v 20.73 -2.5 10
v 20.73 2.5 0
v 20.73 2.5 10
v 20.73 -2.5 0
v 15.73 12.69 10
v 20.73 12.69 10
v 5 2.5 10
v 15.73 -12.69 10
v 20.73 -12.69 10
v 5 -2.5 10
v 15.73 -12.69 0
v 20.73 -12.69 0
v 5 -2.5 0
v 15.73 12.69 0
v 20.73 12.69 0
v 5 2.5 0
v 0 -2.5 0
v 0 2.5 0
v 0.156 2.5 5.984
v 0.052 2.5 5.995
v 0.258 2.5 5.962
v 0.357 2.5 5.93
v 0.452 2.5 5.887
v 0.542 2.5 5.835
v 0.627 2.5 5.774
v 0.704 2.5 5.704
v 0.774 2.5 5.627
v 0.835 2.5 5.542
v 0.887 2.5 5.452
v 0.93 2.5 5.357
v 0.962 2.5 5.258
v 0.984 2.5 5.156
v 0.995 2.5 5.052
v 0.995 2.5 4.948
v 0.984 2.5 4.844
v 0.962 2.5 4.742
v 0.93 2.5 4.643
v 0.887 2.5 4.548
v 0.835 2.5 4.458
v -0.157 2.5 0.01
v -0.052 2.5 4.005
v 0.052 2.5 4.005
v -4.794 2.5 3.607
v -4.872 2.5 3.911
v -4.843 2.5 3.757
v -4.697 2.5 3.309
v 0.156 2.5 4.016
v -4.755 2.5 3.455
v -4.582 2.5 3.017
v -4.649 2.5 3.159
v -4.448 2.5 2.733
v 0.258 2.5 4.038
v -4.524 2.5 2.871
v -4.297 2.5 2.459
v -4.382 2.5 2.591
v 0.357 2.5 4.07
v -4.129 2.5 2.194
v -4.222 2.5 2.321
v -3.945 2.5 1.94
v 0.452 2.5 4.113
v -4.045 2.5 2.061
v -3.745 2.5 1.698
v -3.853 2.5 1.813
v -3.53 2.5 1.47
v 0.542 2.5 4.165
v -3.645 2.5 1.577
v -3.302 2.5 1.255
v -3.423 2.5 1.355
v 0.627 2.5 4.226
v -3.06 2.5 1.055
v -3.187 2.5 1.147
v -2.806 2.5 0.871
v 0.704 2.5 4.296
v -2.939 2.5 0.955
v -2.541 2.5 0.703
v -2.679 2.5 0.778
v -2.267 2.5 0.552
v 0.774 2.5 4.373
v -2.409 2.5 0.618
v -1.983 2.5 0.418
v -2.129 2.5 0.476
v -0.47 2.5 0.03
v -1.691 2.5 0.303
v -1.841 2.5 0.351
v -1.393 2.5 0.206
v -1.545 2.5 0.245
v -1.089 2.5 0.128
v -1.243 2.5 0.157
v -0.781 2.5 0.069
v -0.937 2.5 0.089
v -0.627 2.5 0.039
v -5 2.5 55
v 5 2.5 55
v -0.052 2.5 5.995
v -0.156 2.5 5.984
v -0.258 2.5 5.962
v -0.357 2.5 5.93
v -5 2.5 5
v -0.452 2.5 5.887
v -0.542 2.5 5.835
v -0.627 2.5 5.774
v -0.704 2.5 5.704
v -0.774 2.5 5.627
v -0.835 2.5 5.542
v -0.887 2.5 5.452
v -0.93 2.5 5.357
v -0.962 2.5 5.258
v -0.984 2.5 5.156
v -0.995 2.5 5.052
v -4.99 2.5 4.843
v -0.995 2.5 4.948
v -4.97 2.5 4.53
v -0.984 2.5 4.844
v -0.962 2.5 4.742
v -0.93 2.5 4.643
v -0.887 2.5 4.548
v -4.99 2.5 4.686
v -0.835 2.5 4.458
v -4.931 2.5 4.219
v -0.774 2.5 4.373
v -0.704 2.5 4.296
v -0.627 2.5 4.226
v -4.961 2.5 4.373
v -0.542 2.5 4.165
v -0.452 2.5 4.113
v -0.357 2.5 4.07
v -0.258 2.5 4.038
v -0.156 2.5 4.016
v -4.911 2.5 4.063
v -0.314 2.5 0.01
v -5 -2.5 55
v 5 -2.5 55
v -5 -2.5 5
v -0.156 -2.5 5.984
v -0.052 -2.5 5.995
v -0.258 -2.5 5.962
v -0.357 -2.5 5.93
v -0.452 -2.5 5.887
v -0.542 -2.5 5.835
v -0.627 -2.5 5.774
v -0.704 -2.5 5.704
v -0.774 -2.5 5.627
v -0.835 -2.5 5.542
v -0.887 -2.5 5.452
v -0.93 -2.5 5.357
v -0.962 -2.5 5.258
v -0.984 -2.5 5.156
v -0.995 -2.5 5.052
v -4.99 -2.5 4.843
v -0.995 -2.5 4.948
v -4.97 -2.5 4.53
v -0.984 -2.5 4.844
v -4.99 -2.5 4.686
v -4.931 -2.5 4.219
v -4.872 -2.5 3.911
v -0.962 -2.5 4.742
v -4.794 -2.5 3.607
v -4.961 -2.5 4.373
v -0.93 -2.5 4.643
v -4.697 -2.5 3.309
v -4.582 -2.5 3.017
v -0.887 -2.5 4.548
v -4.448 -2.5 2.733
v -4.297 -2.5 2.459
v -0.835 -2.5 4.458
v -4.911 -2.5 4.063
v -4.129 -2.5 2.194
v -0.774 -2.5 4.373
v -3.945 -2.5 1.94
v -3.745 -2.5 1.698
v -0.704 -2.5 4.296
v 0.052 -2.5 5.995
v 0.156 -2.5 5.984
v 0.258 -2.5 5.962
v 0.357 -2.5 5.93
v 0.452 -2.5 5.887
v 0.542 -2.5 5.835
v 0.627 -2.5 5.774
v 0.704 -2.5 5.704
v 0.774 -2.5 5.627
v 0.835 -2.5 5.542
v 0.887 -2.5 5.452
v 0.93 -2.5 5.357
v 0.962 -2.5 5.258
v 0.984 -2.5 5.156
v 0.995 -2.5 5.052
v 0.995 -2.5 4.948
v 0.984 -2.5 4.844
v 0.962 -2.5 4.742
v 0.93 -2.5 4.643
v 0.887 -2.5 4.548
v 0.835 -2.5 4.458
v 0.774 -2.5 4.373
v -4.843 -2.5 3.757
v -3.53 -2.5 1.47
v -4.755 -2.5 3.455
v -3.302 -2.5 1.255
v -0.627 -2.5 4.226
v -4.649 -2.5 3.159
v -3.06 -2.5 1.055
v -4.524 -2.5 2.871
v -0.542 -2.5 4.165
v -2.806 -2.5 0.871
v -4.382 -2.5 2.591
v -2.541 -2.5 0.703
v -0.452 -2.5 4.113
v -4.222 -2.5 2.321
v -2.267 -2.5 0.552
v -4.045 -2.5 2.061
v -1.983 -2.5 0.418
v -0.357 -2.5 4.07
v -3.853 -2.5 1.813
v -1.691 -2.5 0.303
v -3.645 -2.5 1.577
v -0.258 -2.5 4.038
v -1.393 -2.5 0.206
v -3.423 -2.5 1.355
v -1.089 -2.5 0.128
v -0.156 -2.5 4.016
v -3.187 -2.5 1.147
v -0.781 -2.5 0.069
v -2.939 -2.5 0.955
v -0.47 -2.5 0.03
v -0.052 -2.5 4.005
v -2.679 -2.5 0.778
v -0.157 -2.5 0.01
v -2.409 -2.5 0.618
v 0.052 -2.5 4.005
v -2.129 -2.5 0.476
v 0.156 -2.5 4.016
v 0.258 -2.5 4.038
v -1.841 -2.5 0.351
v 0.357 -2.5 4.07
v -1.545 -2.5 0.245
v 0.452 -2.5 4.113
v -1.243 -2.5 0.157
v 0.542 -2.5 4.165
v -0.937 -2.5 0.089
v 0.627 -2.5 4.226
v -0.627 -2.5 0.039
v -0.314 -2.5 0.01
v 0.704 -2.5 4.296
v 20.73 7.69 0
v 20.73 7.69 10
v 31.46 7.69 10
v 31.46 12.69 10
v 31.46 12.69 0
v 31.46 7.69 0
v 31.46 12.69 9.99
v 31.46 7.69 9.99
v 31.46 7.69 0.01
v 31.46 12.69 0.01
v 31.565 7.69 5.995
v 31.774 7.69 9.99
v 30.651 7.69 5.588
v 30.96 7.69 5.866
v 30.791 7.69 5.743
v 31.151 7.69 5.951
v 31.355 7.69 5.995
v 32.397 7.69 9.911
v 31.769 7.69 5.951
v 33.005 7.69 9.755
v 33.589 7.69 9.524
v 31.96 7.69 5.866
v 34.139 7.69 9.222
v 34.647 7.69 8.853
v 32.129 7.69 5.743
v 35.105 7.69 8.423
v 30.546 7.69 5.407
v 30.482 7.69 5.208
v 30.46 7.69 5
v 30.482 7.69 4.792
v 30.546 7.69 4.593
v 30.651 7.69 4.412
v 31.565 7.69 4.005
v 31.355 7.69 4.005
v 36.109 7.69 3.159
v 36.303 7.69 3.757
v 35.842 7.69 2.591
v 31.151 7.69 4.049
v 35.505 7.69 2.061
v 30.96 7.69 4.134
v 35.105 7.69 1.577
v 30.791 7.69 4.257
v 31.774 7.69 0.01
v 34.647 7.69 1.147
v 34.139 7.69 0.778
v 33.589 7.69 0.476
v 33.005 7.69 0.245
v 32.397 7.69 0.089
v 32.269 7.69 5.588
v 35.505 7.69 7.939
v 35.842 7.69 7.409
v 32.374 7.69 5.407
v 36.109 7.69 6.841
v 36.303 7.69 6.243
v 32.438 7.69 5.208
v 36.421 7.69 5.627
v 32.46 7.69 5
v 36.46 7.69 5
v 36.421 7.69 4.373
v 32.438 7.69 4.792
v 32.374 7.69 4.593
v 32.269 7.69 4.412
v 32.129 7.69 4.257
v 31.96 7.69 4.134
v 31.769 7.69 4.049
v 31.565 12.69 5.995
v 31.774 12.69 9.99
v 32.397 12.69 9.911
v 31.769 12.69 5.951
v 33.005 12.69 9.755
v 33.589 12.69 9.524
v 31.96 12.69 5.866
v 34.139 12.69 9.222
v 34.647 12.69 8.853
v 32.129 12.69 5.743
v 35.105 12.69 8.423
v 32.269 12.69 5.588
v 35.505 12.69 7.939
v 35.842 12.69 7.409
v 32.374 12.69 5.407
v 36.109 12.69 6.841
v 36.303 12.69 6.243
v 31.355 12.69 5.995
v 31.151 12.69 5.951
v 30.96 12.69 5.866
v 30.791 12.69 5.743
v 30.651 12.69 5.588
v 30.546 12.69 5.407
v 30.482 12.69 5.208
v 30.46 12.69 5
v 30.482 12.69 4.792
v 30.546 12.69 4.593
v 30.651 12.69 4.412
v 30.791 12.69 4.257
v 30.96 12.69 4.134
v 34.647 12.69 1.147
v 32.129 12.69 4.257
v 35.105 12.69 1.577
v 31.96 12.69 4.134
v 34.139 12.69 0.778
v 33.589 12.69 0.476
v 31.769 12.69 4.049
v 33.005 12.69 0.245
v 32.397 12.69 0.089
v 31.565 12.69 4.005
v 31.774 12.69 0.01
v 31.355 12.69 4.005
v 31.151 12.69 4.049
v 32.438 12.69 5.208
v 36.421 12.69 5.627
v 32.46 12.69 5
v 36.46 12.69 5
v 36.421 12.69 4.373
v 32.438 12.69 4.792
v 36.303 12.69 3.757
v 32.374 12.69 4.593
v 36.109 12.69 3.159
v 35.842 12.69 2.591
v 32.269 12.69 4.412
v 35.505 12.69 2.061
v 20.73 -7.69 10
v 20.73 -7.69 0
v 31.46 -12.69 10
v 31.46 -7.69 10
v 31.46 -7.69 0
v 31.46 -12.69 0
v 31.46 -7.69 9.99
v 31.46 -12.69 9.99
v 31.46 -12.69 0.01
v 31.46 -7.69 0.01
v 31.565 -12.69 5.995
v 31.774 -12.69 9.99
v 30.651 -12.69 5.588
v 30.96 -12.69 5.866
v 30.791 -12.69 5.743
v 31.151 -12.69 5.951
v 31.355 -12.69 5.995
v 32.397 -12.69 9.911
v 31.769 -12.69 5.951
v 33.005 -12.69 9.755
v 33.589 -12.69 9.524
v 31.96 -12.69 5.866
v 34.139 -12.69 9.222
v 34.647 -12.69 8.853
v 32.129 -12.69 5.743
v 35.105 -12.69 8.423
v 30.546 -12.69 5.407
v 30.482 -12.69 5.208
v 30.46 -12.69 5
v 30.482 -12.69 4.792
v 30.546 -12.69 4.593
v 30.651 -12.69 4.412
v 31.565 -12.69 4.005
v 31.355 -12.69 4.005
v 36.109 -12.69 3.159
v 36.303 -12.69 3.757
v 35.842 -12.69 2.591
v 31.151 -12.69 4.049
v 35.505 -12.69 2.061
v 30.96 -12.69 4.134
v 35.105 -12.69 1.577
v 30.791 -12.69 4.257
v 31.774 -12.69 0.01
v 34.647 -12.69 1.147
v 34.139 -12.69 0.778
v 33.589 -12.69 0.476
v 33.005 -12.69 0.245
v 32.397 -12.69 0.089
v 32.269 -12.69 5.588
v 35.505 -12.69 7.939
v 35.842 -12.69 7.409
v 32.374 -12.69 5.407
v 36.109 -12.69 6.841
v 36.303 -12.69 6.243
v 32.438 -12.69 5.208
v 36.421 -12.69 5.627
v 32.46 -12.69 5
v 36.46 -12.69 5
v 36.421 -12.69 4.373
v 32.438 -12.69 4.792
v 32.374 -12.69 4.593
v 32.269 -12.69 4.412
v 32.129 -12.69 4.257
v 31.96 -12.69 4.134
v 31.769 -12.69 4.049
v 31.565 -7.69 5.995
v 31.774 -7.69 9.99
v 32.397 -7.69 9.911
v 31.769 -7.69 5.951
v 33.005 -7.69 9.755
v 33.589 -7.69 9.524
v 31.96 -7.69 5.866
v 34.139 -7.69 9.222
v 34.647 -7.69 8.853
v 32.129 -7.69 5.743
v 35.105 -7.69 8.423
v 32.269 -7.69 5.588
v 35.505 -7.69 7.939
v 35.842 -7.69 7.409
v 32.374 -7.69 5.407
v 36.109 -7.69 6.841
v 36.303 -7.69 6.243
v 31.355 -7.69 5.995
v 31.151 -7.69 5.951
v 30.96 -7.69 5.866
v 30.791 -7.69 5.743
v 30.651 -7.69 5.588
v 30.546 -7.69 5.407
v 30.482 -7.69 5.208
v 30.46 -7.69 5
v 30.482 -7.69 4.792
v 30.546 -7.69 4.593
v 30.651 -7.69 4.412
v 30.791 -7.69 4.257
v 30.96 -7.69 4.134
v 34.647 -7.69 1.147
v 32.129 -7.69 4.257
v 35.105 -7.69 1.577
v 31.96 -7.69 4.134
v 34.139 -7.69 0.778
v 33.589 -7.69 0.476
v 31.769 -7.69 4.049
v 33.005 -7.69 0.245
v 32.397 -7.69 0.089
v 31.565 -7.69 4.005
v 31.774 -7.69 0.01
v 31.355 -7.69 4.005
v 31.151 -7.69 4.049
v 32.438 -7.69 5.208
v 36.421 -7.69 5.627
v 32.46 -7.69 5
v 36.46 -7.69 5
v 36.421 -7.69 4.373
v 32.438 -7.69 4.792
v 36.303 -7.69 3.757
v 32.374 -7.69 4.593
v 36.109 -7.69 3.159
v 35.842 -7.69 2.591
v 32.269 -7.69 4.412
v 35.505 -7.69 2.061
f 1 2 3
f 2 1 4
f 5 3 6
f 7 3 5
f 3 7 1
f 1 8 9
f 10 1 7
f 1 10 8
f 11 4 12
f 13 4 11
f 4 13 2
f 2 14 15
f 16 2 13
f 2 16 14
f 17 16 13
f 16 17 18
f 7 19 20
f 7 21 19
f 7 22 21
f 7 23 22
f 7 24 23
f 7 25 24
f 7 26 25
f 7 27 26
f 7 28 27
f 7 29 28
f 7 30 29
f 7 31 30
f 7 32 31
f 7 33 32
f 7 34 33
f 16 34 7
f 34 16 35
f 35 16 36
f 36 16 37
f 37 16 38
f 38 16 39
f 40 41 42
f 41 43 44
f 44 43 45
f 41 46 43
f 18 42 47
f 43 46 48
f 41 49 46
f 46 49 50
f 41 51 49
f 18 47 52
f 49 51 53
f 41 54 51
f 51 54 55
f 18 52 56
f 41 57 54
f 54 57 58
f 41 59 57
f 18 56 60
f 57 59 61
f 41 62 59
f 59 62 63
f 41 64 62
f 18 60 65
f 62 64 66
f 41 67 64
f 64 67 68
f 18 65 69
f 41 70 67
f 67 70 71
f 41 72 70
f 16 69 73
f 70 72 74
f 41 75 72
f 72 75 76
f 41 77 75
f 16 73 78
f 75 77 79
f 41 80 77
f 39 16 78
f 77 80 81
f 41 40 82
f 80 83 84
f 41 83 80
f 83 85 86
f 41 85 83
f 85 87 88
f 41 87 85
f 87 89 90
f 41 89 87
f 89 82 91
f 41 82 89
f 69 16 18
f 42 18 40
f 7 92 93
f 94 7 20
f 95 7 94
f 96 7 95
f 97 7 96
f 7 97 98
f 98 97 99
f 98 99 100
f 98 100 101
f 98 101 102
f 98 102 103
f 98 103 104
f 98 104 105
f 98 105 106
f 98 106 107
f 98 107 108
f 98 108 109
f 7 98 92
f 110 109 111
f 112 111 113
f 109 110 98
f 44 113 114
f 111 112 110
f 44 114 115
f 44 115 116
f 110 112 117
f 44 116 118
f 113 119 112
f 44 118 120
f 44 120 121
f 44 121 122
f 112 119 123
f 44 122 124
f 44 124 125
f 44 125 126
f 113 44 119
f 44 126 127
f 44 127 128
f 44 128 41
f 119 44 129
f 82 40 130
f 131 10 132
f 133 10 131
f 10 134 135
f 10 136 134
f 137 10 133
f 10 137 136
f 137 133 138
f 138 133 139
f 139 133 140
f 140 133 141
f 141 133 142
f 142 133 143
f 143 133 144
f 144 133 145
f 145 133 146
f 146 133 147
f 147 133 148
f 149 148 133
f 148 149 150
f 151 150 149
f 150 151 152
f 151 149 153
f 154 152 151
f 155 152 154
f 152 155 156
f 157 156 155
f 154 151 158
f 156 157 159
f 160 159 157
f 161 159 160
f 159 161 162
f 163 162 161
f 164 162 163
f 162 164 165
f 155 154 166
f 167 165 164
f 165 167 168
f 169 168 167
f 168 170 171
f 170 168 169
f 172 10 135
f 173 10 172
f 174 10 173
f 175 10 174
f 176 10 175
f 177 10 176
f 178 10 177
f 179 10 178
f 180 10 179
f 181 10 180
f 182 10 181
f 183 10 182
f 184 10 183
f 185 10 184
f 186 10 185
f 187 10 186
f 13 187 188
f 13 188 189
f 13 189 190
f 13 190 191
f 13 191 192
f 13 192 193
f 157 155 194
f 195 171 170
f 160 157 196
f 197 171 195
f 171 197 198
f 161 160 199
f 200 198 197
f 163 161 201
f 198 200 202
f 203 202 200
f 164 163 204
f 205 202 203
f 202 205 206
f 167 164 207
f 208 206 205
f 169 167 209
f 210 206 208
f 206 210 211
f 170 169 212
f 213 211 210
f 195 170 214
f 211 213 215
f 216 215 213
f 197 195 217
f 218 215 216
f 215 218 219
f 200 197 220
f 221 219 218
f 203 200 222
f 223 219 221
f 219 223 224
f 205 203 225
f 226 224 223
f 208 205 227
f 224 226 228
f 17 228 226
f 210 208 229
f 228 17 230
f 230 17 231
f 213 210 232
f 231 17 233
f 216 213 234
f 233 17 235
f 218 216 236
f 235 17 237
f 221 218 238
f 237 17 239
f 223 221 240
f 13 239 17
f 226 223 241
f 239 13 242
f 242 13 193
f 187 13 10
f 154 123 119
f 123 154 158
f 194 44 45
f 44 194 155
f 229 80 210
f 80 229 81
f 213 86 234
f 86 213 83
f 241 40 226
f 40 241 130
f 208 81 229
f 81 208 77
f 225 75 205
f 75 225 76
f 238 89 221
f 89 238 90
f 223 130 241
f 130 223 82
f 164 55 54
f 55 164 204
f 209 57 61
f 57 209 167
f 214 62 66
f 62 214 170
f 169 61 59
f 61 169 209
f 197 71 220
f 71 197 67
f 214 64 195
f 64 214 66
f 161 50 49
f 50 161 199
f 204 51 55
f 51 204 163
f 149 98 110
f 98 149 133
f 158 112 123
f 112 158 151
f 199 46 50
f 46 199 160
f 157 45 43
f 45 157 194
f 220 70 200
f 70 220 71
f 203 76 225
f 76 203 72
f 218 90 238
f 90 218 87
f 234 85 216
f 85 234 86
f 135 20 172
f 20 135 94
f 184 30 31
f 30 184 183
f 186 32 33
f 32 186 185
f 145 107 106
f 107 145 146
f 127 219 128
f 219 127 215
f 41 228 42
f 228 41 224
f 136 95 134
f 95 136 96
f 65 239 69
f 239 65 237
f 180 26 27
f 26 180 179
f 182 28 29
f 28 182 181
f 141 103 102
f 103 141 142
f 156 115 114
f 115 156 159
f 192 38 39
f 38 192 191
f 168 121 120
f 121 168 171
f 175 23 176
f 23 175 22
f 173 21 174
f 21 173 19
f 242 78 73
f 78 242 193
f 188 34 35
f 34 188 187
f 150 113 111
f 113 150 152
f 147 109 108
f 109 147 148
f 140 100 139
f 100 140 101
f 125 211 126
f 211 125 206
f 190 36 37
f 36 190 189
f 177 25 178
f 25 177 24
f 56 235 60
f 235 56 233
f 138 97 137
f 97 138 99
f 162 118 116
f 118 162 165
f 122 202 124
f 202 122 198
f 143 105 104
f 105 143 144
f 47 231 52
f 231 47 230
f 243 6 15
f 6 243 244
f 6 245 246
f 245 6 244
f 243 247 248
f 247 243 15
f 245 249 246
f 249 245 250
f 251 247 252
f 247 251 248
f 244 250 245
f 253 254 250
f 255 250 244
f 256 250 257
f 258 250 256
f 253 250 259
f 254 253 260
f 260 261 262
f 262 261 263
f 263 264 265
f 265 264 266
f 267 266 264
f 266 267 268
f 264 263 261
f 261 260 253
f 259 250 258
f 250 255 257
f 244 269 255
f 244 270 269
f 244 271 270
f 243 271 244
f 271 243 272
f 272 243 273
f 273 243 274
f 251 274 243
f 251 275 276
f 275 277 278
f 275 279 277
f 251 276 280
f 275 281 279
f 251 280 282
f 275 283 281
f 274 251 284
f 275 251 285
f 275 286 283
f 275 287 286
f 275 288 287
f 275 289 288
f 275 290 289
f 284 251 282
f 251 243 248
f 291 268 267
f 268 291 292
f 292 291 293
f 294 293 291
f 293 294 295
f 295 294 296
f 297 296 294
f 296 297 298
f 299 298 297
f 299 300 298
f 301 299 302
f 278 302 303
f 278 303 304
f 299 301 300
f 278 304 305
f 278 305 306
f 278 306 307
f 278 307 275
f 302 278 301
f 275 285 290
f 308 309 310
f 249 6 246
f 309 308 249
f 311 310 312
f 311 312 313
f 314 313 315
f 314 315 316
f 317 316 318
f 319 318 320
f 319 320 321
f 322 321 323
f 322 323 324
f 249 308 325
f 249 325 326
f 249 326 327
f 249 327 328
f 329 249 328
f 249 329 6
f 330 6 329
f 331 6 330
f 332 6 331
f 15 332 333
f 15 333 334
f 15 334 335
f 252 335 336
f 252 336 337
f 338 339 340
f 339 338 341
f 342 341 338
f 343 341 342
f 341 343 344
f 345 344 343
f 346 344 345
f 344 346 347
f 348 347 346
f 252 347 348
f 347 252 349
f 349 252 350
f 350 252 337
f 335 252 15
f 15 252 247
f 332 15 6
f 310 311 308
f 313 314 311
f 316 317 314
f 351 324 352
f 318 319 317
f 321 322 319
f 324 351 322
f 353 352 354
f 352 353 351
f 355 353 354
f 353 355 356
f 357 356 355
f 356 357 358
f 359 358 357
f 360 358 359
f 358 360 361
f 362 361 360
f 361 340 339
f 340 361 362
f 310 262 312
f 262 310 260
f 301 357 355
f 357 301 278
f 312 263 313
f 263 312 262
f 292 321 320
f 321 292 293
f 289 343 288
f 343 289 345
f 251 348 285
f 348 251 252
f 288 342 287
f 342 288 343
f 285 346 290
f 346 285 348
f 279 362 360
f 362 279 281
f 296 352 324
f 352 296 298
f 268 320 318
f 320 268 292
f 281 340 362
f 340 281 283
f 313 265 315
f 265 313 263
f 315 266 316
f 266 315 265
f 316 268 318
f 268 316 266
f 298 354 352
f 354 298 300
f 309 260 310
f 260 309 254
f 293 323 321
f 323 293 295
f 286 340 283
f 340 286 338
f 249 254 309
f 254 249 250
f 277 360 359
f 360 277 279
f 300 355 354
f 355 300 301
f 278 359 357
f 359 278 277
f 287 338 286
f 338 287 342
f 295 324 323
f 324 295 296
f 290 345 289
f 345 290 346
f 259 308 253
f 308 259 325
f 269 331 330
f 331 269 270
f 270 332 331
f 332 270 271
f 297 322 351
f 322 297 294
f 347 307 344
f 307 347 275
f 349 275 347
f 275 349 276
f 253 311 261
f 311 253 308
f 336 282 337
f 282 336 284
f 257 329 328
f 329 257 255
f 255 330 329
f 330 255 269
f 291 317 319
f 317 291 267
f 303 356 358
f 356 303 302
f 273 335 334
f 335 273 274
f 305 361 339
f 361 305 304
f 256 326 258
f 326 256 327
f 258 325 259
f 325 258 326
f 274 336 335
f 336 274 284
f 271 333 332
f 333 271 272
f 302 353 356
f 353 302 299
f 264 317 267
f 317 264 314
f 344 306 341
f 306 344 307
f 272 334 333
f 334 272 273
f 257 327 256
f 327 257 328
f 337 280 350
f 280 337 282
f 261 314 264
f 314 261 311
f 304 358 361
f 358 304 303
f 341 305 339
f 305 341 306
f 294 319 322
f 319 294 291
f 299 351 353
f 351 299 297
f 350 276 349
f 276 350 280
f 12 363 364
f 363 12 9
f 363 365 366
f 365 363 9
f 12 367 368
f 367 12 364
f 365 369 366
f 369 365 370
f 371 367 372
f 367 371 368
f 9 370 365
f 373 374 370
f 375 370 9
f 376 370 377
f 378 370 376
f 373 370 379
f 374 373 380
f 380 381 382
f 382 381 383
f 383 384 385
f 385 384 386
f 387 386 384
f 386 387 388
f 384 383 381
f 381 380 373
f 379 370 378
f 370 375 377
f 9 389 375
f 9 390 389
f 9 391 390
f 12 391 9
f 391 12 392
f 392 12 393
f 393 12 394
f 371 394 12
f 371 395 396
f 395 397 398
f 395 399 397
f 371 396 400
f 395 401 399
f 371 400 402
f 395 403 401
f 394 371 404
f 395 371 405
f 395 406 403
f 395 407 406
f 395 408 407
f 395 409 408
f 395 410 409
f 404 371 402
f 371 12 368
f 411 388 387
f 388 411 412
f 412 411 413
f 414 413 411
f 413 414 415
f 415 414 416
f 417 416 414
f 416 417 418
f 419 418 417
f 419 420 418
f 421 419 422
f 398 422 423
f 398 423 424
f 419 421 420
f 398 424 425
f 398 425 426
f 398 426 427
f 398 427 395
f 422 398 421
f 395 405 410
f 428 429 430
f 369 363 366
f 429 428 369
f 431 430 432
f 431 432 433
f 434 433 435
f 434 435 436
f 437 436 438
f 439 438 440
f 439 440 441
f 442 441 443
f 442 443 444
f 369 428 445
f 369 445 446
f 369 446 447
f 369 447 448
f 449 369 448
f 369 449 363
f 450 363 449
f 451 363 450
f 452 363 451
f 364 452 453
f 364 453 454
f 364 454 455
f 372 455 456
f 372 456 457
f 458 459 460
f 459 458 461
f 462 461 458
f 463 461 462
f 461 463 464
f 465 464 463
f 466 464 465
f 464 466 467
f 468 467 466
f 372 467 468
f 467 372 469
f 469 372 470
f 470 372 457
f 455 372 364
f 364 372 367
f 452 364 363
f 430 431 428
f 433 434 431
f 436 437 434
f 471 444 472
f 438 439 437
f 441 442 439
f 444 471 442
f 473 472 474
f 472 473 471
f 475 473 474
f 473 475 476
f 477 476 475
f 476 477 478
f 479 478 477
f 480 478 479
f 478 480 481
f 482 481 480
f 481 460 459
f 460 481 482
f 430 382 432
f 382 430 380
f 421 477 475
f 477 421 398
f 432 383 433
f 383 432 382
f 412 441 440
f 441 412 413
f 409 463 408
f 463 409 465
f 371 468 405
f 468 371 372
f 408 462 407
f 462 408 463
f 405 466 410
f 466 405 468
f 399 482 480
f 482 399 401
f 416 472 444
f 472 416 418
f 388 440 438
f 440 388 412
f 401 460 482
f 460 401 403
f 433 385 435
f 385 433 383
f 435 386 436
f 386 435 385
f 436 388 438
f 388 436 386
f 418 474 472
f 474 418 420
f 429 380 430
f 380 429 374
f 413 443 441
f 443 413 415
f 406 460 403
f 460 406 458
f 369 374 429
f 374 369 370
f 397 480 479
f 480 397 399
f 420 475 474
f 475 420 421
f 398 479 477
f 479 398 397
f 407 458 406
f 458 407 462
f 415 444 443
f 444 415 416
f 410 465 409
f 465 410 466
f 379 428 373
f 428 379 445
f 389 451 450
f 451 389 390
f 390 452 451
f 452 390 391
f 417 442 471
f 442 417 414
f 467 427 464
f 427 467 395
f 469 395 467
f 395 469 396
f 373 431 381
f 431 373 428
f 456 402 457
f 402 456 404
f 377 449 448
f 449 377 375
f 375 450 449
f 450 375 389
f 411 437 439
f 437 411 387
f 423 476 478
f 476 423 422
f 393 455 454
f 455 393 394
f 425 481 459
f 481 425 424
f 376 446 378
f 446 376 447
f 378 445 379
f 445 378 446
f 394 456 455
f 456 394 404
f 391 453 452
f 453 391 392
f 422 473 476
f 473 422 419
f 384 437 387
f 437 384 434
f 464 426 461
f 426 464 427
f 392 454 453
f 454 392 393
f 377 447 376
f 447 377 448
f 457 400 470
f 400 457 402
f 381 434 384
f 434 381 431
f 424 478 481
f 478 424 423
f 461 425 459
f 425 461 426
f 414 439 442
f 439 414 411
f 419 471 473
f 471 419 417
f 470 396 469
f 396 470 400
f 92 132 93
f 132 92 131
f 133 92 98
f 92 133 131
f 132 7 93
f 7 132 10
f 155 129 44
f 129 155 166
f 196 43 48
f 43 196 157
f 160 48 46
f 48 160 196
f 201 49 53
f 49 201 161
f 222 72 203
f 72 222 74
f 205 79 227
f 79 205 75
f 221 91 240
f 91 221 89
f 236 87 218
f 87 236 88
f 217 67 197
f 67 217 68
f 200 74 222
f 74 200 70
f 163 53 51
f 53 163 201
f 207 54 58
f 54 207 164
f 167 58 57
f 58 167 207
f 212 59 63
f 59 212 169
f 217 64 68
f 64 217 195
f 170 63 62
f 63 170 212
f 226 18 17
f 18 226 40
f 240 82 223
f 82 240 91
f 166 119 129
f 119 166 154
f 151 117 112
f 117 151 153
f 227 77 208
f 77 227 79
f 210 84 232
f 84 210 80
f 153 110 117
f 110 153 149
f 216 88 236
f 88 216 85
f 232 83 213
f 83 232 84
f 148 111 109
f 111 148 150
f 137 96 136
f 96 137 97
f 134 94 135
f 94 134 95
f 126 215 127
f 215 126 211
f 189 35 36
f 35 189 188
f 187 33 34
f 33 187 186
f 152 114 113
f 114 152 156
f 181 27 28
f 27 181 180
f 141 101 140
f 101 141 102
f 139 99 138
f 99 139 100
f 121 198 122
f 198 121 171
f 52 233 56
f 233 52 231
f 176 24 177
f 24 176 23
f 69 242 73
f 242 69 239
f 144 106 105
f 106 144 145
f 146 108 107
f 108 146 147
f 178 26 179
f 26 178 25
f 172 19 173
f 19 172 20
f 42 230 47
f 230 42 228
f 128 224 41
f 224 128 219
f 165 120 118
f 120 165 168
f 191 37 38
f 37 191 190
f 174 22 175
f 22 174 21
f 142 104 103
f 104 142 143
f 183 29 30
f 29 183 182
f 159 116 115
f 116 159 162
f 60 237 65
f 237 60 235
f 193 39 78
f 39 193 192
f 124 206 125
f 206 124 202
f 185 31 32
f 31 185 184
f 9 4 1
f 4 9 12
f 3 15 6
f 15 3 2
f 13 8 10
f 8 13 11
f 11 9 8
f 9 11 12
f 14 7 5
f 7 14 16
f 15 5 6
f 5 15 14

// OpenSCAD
// file: ../roundedArm.scad
//armlength is from the centre of the hole to the end of the flat end
module roundedArm(armWidth,armHeight,armLength,holeRadius){

difference(){
union(){
			translate([0,-armWidth/2,0]) cube([armLength,armWidth,armHeight]);

			
				translate([0,armWidth/2,armHeight/2]) rotate([90,0,0]) cylinder(r=armHeight/2, h= armWidth, $fn = 50);
			}


if(holeRadius > 0){
	translate([0,armWidth/2+1,armHeight/2]) rotate([90,0,0]) cylinder(r=holeRadius, h= armWidth+2, $fn = 30);
}		

}

}

roundedArm(10,10,30,2);
// main file
//arm to hold the idler wheel.  hinged in middle, wheel at one end and spring at the other.

//from the side on it is an L, from the top it is an Y

//planning to use an M2.5 bolt to hold the spring at either end
use <../roundedArm.scad>;

//tracks ahve a gap of 0.145 between plastic that rubs together
gap=0.15;
idlerHeight = 15.23;

gapWidth = idlerHeight + gap;

armThick=5;
armHeight=10;

//how much space between the axle of the idler and anything else
idlerRadiusAllowance = 8.73 + 2;
hingeRadiusAllowance = armHeight;


//distance between hingle axle and idler axle
armLength=10 + idlerRadiusAllowance;

//height of arm which holds the spring
//springArmLength=

springArmLength=20;

//same as idler?
axleRadius = 1;

springArmOffset = 5;

triangleJoinsX=armHeight/2;


roundedArm(armThick,armHeight,armLength,axleRadius);
translate([armLength+idlerRadiusAllowance,gapWidth/2+armThick/2,0]) rotate([0,0,180])  roundedArm(armThick,armHeight,idlerRadiusAllowance,axleRadius);
translate([armLength+idlerRadiusAllowance,-gapWidth/2-armThick/2,0]) rotate([0,0,180])  roundedArm(armThick,armHeight,idlerRadiusAllowance,axleRadius);

//triangly bit to link the arms together
linear_extrude(height=armHeight) polygon([[armLength,-gapWidth/2-armThick],[armLength-armThick,-gapWidth/2-armThick],[triangleJoinsX,-armThick/2],[triangleJoinsX,armThick/2],[armLength-armThick,gapWidth/2+armThick],[armLength,gapWidth/2+armThick]]);


//arm upwards for spring
//translate([-armHeight/2,-armThick/2,armHeight/2]) cube([armHeight,armThick,50]);
translate([armHeight/2,0,armHeight/2]) rotate([0,-90,0]) roundedArm(armThick,armHeight,50,axleRadius);


//translate([0,20,armHeight/2]) rotate([90,0,0]) cylinder(r=axleRadius, h= 60, $fn = 30);
